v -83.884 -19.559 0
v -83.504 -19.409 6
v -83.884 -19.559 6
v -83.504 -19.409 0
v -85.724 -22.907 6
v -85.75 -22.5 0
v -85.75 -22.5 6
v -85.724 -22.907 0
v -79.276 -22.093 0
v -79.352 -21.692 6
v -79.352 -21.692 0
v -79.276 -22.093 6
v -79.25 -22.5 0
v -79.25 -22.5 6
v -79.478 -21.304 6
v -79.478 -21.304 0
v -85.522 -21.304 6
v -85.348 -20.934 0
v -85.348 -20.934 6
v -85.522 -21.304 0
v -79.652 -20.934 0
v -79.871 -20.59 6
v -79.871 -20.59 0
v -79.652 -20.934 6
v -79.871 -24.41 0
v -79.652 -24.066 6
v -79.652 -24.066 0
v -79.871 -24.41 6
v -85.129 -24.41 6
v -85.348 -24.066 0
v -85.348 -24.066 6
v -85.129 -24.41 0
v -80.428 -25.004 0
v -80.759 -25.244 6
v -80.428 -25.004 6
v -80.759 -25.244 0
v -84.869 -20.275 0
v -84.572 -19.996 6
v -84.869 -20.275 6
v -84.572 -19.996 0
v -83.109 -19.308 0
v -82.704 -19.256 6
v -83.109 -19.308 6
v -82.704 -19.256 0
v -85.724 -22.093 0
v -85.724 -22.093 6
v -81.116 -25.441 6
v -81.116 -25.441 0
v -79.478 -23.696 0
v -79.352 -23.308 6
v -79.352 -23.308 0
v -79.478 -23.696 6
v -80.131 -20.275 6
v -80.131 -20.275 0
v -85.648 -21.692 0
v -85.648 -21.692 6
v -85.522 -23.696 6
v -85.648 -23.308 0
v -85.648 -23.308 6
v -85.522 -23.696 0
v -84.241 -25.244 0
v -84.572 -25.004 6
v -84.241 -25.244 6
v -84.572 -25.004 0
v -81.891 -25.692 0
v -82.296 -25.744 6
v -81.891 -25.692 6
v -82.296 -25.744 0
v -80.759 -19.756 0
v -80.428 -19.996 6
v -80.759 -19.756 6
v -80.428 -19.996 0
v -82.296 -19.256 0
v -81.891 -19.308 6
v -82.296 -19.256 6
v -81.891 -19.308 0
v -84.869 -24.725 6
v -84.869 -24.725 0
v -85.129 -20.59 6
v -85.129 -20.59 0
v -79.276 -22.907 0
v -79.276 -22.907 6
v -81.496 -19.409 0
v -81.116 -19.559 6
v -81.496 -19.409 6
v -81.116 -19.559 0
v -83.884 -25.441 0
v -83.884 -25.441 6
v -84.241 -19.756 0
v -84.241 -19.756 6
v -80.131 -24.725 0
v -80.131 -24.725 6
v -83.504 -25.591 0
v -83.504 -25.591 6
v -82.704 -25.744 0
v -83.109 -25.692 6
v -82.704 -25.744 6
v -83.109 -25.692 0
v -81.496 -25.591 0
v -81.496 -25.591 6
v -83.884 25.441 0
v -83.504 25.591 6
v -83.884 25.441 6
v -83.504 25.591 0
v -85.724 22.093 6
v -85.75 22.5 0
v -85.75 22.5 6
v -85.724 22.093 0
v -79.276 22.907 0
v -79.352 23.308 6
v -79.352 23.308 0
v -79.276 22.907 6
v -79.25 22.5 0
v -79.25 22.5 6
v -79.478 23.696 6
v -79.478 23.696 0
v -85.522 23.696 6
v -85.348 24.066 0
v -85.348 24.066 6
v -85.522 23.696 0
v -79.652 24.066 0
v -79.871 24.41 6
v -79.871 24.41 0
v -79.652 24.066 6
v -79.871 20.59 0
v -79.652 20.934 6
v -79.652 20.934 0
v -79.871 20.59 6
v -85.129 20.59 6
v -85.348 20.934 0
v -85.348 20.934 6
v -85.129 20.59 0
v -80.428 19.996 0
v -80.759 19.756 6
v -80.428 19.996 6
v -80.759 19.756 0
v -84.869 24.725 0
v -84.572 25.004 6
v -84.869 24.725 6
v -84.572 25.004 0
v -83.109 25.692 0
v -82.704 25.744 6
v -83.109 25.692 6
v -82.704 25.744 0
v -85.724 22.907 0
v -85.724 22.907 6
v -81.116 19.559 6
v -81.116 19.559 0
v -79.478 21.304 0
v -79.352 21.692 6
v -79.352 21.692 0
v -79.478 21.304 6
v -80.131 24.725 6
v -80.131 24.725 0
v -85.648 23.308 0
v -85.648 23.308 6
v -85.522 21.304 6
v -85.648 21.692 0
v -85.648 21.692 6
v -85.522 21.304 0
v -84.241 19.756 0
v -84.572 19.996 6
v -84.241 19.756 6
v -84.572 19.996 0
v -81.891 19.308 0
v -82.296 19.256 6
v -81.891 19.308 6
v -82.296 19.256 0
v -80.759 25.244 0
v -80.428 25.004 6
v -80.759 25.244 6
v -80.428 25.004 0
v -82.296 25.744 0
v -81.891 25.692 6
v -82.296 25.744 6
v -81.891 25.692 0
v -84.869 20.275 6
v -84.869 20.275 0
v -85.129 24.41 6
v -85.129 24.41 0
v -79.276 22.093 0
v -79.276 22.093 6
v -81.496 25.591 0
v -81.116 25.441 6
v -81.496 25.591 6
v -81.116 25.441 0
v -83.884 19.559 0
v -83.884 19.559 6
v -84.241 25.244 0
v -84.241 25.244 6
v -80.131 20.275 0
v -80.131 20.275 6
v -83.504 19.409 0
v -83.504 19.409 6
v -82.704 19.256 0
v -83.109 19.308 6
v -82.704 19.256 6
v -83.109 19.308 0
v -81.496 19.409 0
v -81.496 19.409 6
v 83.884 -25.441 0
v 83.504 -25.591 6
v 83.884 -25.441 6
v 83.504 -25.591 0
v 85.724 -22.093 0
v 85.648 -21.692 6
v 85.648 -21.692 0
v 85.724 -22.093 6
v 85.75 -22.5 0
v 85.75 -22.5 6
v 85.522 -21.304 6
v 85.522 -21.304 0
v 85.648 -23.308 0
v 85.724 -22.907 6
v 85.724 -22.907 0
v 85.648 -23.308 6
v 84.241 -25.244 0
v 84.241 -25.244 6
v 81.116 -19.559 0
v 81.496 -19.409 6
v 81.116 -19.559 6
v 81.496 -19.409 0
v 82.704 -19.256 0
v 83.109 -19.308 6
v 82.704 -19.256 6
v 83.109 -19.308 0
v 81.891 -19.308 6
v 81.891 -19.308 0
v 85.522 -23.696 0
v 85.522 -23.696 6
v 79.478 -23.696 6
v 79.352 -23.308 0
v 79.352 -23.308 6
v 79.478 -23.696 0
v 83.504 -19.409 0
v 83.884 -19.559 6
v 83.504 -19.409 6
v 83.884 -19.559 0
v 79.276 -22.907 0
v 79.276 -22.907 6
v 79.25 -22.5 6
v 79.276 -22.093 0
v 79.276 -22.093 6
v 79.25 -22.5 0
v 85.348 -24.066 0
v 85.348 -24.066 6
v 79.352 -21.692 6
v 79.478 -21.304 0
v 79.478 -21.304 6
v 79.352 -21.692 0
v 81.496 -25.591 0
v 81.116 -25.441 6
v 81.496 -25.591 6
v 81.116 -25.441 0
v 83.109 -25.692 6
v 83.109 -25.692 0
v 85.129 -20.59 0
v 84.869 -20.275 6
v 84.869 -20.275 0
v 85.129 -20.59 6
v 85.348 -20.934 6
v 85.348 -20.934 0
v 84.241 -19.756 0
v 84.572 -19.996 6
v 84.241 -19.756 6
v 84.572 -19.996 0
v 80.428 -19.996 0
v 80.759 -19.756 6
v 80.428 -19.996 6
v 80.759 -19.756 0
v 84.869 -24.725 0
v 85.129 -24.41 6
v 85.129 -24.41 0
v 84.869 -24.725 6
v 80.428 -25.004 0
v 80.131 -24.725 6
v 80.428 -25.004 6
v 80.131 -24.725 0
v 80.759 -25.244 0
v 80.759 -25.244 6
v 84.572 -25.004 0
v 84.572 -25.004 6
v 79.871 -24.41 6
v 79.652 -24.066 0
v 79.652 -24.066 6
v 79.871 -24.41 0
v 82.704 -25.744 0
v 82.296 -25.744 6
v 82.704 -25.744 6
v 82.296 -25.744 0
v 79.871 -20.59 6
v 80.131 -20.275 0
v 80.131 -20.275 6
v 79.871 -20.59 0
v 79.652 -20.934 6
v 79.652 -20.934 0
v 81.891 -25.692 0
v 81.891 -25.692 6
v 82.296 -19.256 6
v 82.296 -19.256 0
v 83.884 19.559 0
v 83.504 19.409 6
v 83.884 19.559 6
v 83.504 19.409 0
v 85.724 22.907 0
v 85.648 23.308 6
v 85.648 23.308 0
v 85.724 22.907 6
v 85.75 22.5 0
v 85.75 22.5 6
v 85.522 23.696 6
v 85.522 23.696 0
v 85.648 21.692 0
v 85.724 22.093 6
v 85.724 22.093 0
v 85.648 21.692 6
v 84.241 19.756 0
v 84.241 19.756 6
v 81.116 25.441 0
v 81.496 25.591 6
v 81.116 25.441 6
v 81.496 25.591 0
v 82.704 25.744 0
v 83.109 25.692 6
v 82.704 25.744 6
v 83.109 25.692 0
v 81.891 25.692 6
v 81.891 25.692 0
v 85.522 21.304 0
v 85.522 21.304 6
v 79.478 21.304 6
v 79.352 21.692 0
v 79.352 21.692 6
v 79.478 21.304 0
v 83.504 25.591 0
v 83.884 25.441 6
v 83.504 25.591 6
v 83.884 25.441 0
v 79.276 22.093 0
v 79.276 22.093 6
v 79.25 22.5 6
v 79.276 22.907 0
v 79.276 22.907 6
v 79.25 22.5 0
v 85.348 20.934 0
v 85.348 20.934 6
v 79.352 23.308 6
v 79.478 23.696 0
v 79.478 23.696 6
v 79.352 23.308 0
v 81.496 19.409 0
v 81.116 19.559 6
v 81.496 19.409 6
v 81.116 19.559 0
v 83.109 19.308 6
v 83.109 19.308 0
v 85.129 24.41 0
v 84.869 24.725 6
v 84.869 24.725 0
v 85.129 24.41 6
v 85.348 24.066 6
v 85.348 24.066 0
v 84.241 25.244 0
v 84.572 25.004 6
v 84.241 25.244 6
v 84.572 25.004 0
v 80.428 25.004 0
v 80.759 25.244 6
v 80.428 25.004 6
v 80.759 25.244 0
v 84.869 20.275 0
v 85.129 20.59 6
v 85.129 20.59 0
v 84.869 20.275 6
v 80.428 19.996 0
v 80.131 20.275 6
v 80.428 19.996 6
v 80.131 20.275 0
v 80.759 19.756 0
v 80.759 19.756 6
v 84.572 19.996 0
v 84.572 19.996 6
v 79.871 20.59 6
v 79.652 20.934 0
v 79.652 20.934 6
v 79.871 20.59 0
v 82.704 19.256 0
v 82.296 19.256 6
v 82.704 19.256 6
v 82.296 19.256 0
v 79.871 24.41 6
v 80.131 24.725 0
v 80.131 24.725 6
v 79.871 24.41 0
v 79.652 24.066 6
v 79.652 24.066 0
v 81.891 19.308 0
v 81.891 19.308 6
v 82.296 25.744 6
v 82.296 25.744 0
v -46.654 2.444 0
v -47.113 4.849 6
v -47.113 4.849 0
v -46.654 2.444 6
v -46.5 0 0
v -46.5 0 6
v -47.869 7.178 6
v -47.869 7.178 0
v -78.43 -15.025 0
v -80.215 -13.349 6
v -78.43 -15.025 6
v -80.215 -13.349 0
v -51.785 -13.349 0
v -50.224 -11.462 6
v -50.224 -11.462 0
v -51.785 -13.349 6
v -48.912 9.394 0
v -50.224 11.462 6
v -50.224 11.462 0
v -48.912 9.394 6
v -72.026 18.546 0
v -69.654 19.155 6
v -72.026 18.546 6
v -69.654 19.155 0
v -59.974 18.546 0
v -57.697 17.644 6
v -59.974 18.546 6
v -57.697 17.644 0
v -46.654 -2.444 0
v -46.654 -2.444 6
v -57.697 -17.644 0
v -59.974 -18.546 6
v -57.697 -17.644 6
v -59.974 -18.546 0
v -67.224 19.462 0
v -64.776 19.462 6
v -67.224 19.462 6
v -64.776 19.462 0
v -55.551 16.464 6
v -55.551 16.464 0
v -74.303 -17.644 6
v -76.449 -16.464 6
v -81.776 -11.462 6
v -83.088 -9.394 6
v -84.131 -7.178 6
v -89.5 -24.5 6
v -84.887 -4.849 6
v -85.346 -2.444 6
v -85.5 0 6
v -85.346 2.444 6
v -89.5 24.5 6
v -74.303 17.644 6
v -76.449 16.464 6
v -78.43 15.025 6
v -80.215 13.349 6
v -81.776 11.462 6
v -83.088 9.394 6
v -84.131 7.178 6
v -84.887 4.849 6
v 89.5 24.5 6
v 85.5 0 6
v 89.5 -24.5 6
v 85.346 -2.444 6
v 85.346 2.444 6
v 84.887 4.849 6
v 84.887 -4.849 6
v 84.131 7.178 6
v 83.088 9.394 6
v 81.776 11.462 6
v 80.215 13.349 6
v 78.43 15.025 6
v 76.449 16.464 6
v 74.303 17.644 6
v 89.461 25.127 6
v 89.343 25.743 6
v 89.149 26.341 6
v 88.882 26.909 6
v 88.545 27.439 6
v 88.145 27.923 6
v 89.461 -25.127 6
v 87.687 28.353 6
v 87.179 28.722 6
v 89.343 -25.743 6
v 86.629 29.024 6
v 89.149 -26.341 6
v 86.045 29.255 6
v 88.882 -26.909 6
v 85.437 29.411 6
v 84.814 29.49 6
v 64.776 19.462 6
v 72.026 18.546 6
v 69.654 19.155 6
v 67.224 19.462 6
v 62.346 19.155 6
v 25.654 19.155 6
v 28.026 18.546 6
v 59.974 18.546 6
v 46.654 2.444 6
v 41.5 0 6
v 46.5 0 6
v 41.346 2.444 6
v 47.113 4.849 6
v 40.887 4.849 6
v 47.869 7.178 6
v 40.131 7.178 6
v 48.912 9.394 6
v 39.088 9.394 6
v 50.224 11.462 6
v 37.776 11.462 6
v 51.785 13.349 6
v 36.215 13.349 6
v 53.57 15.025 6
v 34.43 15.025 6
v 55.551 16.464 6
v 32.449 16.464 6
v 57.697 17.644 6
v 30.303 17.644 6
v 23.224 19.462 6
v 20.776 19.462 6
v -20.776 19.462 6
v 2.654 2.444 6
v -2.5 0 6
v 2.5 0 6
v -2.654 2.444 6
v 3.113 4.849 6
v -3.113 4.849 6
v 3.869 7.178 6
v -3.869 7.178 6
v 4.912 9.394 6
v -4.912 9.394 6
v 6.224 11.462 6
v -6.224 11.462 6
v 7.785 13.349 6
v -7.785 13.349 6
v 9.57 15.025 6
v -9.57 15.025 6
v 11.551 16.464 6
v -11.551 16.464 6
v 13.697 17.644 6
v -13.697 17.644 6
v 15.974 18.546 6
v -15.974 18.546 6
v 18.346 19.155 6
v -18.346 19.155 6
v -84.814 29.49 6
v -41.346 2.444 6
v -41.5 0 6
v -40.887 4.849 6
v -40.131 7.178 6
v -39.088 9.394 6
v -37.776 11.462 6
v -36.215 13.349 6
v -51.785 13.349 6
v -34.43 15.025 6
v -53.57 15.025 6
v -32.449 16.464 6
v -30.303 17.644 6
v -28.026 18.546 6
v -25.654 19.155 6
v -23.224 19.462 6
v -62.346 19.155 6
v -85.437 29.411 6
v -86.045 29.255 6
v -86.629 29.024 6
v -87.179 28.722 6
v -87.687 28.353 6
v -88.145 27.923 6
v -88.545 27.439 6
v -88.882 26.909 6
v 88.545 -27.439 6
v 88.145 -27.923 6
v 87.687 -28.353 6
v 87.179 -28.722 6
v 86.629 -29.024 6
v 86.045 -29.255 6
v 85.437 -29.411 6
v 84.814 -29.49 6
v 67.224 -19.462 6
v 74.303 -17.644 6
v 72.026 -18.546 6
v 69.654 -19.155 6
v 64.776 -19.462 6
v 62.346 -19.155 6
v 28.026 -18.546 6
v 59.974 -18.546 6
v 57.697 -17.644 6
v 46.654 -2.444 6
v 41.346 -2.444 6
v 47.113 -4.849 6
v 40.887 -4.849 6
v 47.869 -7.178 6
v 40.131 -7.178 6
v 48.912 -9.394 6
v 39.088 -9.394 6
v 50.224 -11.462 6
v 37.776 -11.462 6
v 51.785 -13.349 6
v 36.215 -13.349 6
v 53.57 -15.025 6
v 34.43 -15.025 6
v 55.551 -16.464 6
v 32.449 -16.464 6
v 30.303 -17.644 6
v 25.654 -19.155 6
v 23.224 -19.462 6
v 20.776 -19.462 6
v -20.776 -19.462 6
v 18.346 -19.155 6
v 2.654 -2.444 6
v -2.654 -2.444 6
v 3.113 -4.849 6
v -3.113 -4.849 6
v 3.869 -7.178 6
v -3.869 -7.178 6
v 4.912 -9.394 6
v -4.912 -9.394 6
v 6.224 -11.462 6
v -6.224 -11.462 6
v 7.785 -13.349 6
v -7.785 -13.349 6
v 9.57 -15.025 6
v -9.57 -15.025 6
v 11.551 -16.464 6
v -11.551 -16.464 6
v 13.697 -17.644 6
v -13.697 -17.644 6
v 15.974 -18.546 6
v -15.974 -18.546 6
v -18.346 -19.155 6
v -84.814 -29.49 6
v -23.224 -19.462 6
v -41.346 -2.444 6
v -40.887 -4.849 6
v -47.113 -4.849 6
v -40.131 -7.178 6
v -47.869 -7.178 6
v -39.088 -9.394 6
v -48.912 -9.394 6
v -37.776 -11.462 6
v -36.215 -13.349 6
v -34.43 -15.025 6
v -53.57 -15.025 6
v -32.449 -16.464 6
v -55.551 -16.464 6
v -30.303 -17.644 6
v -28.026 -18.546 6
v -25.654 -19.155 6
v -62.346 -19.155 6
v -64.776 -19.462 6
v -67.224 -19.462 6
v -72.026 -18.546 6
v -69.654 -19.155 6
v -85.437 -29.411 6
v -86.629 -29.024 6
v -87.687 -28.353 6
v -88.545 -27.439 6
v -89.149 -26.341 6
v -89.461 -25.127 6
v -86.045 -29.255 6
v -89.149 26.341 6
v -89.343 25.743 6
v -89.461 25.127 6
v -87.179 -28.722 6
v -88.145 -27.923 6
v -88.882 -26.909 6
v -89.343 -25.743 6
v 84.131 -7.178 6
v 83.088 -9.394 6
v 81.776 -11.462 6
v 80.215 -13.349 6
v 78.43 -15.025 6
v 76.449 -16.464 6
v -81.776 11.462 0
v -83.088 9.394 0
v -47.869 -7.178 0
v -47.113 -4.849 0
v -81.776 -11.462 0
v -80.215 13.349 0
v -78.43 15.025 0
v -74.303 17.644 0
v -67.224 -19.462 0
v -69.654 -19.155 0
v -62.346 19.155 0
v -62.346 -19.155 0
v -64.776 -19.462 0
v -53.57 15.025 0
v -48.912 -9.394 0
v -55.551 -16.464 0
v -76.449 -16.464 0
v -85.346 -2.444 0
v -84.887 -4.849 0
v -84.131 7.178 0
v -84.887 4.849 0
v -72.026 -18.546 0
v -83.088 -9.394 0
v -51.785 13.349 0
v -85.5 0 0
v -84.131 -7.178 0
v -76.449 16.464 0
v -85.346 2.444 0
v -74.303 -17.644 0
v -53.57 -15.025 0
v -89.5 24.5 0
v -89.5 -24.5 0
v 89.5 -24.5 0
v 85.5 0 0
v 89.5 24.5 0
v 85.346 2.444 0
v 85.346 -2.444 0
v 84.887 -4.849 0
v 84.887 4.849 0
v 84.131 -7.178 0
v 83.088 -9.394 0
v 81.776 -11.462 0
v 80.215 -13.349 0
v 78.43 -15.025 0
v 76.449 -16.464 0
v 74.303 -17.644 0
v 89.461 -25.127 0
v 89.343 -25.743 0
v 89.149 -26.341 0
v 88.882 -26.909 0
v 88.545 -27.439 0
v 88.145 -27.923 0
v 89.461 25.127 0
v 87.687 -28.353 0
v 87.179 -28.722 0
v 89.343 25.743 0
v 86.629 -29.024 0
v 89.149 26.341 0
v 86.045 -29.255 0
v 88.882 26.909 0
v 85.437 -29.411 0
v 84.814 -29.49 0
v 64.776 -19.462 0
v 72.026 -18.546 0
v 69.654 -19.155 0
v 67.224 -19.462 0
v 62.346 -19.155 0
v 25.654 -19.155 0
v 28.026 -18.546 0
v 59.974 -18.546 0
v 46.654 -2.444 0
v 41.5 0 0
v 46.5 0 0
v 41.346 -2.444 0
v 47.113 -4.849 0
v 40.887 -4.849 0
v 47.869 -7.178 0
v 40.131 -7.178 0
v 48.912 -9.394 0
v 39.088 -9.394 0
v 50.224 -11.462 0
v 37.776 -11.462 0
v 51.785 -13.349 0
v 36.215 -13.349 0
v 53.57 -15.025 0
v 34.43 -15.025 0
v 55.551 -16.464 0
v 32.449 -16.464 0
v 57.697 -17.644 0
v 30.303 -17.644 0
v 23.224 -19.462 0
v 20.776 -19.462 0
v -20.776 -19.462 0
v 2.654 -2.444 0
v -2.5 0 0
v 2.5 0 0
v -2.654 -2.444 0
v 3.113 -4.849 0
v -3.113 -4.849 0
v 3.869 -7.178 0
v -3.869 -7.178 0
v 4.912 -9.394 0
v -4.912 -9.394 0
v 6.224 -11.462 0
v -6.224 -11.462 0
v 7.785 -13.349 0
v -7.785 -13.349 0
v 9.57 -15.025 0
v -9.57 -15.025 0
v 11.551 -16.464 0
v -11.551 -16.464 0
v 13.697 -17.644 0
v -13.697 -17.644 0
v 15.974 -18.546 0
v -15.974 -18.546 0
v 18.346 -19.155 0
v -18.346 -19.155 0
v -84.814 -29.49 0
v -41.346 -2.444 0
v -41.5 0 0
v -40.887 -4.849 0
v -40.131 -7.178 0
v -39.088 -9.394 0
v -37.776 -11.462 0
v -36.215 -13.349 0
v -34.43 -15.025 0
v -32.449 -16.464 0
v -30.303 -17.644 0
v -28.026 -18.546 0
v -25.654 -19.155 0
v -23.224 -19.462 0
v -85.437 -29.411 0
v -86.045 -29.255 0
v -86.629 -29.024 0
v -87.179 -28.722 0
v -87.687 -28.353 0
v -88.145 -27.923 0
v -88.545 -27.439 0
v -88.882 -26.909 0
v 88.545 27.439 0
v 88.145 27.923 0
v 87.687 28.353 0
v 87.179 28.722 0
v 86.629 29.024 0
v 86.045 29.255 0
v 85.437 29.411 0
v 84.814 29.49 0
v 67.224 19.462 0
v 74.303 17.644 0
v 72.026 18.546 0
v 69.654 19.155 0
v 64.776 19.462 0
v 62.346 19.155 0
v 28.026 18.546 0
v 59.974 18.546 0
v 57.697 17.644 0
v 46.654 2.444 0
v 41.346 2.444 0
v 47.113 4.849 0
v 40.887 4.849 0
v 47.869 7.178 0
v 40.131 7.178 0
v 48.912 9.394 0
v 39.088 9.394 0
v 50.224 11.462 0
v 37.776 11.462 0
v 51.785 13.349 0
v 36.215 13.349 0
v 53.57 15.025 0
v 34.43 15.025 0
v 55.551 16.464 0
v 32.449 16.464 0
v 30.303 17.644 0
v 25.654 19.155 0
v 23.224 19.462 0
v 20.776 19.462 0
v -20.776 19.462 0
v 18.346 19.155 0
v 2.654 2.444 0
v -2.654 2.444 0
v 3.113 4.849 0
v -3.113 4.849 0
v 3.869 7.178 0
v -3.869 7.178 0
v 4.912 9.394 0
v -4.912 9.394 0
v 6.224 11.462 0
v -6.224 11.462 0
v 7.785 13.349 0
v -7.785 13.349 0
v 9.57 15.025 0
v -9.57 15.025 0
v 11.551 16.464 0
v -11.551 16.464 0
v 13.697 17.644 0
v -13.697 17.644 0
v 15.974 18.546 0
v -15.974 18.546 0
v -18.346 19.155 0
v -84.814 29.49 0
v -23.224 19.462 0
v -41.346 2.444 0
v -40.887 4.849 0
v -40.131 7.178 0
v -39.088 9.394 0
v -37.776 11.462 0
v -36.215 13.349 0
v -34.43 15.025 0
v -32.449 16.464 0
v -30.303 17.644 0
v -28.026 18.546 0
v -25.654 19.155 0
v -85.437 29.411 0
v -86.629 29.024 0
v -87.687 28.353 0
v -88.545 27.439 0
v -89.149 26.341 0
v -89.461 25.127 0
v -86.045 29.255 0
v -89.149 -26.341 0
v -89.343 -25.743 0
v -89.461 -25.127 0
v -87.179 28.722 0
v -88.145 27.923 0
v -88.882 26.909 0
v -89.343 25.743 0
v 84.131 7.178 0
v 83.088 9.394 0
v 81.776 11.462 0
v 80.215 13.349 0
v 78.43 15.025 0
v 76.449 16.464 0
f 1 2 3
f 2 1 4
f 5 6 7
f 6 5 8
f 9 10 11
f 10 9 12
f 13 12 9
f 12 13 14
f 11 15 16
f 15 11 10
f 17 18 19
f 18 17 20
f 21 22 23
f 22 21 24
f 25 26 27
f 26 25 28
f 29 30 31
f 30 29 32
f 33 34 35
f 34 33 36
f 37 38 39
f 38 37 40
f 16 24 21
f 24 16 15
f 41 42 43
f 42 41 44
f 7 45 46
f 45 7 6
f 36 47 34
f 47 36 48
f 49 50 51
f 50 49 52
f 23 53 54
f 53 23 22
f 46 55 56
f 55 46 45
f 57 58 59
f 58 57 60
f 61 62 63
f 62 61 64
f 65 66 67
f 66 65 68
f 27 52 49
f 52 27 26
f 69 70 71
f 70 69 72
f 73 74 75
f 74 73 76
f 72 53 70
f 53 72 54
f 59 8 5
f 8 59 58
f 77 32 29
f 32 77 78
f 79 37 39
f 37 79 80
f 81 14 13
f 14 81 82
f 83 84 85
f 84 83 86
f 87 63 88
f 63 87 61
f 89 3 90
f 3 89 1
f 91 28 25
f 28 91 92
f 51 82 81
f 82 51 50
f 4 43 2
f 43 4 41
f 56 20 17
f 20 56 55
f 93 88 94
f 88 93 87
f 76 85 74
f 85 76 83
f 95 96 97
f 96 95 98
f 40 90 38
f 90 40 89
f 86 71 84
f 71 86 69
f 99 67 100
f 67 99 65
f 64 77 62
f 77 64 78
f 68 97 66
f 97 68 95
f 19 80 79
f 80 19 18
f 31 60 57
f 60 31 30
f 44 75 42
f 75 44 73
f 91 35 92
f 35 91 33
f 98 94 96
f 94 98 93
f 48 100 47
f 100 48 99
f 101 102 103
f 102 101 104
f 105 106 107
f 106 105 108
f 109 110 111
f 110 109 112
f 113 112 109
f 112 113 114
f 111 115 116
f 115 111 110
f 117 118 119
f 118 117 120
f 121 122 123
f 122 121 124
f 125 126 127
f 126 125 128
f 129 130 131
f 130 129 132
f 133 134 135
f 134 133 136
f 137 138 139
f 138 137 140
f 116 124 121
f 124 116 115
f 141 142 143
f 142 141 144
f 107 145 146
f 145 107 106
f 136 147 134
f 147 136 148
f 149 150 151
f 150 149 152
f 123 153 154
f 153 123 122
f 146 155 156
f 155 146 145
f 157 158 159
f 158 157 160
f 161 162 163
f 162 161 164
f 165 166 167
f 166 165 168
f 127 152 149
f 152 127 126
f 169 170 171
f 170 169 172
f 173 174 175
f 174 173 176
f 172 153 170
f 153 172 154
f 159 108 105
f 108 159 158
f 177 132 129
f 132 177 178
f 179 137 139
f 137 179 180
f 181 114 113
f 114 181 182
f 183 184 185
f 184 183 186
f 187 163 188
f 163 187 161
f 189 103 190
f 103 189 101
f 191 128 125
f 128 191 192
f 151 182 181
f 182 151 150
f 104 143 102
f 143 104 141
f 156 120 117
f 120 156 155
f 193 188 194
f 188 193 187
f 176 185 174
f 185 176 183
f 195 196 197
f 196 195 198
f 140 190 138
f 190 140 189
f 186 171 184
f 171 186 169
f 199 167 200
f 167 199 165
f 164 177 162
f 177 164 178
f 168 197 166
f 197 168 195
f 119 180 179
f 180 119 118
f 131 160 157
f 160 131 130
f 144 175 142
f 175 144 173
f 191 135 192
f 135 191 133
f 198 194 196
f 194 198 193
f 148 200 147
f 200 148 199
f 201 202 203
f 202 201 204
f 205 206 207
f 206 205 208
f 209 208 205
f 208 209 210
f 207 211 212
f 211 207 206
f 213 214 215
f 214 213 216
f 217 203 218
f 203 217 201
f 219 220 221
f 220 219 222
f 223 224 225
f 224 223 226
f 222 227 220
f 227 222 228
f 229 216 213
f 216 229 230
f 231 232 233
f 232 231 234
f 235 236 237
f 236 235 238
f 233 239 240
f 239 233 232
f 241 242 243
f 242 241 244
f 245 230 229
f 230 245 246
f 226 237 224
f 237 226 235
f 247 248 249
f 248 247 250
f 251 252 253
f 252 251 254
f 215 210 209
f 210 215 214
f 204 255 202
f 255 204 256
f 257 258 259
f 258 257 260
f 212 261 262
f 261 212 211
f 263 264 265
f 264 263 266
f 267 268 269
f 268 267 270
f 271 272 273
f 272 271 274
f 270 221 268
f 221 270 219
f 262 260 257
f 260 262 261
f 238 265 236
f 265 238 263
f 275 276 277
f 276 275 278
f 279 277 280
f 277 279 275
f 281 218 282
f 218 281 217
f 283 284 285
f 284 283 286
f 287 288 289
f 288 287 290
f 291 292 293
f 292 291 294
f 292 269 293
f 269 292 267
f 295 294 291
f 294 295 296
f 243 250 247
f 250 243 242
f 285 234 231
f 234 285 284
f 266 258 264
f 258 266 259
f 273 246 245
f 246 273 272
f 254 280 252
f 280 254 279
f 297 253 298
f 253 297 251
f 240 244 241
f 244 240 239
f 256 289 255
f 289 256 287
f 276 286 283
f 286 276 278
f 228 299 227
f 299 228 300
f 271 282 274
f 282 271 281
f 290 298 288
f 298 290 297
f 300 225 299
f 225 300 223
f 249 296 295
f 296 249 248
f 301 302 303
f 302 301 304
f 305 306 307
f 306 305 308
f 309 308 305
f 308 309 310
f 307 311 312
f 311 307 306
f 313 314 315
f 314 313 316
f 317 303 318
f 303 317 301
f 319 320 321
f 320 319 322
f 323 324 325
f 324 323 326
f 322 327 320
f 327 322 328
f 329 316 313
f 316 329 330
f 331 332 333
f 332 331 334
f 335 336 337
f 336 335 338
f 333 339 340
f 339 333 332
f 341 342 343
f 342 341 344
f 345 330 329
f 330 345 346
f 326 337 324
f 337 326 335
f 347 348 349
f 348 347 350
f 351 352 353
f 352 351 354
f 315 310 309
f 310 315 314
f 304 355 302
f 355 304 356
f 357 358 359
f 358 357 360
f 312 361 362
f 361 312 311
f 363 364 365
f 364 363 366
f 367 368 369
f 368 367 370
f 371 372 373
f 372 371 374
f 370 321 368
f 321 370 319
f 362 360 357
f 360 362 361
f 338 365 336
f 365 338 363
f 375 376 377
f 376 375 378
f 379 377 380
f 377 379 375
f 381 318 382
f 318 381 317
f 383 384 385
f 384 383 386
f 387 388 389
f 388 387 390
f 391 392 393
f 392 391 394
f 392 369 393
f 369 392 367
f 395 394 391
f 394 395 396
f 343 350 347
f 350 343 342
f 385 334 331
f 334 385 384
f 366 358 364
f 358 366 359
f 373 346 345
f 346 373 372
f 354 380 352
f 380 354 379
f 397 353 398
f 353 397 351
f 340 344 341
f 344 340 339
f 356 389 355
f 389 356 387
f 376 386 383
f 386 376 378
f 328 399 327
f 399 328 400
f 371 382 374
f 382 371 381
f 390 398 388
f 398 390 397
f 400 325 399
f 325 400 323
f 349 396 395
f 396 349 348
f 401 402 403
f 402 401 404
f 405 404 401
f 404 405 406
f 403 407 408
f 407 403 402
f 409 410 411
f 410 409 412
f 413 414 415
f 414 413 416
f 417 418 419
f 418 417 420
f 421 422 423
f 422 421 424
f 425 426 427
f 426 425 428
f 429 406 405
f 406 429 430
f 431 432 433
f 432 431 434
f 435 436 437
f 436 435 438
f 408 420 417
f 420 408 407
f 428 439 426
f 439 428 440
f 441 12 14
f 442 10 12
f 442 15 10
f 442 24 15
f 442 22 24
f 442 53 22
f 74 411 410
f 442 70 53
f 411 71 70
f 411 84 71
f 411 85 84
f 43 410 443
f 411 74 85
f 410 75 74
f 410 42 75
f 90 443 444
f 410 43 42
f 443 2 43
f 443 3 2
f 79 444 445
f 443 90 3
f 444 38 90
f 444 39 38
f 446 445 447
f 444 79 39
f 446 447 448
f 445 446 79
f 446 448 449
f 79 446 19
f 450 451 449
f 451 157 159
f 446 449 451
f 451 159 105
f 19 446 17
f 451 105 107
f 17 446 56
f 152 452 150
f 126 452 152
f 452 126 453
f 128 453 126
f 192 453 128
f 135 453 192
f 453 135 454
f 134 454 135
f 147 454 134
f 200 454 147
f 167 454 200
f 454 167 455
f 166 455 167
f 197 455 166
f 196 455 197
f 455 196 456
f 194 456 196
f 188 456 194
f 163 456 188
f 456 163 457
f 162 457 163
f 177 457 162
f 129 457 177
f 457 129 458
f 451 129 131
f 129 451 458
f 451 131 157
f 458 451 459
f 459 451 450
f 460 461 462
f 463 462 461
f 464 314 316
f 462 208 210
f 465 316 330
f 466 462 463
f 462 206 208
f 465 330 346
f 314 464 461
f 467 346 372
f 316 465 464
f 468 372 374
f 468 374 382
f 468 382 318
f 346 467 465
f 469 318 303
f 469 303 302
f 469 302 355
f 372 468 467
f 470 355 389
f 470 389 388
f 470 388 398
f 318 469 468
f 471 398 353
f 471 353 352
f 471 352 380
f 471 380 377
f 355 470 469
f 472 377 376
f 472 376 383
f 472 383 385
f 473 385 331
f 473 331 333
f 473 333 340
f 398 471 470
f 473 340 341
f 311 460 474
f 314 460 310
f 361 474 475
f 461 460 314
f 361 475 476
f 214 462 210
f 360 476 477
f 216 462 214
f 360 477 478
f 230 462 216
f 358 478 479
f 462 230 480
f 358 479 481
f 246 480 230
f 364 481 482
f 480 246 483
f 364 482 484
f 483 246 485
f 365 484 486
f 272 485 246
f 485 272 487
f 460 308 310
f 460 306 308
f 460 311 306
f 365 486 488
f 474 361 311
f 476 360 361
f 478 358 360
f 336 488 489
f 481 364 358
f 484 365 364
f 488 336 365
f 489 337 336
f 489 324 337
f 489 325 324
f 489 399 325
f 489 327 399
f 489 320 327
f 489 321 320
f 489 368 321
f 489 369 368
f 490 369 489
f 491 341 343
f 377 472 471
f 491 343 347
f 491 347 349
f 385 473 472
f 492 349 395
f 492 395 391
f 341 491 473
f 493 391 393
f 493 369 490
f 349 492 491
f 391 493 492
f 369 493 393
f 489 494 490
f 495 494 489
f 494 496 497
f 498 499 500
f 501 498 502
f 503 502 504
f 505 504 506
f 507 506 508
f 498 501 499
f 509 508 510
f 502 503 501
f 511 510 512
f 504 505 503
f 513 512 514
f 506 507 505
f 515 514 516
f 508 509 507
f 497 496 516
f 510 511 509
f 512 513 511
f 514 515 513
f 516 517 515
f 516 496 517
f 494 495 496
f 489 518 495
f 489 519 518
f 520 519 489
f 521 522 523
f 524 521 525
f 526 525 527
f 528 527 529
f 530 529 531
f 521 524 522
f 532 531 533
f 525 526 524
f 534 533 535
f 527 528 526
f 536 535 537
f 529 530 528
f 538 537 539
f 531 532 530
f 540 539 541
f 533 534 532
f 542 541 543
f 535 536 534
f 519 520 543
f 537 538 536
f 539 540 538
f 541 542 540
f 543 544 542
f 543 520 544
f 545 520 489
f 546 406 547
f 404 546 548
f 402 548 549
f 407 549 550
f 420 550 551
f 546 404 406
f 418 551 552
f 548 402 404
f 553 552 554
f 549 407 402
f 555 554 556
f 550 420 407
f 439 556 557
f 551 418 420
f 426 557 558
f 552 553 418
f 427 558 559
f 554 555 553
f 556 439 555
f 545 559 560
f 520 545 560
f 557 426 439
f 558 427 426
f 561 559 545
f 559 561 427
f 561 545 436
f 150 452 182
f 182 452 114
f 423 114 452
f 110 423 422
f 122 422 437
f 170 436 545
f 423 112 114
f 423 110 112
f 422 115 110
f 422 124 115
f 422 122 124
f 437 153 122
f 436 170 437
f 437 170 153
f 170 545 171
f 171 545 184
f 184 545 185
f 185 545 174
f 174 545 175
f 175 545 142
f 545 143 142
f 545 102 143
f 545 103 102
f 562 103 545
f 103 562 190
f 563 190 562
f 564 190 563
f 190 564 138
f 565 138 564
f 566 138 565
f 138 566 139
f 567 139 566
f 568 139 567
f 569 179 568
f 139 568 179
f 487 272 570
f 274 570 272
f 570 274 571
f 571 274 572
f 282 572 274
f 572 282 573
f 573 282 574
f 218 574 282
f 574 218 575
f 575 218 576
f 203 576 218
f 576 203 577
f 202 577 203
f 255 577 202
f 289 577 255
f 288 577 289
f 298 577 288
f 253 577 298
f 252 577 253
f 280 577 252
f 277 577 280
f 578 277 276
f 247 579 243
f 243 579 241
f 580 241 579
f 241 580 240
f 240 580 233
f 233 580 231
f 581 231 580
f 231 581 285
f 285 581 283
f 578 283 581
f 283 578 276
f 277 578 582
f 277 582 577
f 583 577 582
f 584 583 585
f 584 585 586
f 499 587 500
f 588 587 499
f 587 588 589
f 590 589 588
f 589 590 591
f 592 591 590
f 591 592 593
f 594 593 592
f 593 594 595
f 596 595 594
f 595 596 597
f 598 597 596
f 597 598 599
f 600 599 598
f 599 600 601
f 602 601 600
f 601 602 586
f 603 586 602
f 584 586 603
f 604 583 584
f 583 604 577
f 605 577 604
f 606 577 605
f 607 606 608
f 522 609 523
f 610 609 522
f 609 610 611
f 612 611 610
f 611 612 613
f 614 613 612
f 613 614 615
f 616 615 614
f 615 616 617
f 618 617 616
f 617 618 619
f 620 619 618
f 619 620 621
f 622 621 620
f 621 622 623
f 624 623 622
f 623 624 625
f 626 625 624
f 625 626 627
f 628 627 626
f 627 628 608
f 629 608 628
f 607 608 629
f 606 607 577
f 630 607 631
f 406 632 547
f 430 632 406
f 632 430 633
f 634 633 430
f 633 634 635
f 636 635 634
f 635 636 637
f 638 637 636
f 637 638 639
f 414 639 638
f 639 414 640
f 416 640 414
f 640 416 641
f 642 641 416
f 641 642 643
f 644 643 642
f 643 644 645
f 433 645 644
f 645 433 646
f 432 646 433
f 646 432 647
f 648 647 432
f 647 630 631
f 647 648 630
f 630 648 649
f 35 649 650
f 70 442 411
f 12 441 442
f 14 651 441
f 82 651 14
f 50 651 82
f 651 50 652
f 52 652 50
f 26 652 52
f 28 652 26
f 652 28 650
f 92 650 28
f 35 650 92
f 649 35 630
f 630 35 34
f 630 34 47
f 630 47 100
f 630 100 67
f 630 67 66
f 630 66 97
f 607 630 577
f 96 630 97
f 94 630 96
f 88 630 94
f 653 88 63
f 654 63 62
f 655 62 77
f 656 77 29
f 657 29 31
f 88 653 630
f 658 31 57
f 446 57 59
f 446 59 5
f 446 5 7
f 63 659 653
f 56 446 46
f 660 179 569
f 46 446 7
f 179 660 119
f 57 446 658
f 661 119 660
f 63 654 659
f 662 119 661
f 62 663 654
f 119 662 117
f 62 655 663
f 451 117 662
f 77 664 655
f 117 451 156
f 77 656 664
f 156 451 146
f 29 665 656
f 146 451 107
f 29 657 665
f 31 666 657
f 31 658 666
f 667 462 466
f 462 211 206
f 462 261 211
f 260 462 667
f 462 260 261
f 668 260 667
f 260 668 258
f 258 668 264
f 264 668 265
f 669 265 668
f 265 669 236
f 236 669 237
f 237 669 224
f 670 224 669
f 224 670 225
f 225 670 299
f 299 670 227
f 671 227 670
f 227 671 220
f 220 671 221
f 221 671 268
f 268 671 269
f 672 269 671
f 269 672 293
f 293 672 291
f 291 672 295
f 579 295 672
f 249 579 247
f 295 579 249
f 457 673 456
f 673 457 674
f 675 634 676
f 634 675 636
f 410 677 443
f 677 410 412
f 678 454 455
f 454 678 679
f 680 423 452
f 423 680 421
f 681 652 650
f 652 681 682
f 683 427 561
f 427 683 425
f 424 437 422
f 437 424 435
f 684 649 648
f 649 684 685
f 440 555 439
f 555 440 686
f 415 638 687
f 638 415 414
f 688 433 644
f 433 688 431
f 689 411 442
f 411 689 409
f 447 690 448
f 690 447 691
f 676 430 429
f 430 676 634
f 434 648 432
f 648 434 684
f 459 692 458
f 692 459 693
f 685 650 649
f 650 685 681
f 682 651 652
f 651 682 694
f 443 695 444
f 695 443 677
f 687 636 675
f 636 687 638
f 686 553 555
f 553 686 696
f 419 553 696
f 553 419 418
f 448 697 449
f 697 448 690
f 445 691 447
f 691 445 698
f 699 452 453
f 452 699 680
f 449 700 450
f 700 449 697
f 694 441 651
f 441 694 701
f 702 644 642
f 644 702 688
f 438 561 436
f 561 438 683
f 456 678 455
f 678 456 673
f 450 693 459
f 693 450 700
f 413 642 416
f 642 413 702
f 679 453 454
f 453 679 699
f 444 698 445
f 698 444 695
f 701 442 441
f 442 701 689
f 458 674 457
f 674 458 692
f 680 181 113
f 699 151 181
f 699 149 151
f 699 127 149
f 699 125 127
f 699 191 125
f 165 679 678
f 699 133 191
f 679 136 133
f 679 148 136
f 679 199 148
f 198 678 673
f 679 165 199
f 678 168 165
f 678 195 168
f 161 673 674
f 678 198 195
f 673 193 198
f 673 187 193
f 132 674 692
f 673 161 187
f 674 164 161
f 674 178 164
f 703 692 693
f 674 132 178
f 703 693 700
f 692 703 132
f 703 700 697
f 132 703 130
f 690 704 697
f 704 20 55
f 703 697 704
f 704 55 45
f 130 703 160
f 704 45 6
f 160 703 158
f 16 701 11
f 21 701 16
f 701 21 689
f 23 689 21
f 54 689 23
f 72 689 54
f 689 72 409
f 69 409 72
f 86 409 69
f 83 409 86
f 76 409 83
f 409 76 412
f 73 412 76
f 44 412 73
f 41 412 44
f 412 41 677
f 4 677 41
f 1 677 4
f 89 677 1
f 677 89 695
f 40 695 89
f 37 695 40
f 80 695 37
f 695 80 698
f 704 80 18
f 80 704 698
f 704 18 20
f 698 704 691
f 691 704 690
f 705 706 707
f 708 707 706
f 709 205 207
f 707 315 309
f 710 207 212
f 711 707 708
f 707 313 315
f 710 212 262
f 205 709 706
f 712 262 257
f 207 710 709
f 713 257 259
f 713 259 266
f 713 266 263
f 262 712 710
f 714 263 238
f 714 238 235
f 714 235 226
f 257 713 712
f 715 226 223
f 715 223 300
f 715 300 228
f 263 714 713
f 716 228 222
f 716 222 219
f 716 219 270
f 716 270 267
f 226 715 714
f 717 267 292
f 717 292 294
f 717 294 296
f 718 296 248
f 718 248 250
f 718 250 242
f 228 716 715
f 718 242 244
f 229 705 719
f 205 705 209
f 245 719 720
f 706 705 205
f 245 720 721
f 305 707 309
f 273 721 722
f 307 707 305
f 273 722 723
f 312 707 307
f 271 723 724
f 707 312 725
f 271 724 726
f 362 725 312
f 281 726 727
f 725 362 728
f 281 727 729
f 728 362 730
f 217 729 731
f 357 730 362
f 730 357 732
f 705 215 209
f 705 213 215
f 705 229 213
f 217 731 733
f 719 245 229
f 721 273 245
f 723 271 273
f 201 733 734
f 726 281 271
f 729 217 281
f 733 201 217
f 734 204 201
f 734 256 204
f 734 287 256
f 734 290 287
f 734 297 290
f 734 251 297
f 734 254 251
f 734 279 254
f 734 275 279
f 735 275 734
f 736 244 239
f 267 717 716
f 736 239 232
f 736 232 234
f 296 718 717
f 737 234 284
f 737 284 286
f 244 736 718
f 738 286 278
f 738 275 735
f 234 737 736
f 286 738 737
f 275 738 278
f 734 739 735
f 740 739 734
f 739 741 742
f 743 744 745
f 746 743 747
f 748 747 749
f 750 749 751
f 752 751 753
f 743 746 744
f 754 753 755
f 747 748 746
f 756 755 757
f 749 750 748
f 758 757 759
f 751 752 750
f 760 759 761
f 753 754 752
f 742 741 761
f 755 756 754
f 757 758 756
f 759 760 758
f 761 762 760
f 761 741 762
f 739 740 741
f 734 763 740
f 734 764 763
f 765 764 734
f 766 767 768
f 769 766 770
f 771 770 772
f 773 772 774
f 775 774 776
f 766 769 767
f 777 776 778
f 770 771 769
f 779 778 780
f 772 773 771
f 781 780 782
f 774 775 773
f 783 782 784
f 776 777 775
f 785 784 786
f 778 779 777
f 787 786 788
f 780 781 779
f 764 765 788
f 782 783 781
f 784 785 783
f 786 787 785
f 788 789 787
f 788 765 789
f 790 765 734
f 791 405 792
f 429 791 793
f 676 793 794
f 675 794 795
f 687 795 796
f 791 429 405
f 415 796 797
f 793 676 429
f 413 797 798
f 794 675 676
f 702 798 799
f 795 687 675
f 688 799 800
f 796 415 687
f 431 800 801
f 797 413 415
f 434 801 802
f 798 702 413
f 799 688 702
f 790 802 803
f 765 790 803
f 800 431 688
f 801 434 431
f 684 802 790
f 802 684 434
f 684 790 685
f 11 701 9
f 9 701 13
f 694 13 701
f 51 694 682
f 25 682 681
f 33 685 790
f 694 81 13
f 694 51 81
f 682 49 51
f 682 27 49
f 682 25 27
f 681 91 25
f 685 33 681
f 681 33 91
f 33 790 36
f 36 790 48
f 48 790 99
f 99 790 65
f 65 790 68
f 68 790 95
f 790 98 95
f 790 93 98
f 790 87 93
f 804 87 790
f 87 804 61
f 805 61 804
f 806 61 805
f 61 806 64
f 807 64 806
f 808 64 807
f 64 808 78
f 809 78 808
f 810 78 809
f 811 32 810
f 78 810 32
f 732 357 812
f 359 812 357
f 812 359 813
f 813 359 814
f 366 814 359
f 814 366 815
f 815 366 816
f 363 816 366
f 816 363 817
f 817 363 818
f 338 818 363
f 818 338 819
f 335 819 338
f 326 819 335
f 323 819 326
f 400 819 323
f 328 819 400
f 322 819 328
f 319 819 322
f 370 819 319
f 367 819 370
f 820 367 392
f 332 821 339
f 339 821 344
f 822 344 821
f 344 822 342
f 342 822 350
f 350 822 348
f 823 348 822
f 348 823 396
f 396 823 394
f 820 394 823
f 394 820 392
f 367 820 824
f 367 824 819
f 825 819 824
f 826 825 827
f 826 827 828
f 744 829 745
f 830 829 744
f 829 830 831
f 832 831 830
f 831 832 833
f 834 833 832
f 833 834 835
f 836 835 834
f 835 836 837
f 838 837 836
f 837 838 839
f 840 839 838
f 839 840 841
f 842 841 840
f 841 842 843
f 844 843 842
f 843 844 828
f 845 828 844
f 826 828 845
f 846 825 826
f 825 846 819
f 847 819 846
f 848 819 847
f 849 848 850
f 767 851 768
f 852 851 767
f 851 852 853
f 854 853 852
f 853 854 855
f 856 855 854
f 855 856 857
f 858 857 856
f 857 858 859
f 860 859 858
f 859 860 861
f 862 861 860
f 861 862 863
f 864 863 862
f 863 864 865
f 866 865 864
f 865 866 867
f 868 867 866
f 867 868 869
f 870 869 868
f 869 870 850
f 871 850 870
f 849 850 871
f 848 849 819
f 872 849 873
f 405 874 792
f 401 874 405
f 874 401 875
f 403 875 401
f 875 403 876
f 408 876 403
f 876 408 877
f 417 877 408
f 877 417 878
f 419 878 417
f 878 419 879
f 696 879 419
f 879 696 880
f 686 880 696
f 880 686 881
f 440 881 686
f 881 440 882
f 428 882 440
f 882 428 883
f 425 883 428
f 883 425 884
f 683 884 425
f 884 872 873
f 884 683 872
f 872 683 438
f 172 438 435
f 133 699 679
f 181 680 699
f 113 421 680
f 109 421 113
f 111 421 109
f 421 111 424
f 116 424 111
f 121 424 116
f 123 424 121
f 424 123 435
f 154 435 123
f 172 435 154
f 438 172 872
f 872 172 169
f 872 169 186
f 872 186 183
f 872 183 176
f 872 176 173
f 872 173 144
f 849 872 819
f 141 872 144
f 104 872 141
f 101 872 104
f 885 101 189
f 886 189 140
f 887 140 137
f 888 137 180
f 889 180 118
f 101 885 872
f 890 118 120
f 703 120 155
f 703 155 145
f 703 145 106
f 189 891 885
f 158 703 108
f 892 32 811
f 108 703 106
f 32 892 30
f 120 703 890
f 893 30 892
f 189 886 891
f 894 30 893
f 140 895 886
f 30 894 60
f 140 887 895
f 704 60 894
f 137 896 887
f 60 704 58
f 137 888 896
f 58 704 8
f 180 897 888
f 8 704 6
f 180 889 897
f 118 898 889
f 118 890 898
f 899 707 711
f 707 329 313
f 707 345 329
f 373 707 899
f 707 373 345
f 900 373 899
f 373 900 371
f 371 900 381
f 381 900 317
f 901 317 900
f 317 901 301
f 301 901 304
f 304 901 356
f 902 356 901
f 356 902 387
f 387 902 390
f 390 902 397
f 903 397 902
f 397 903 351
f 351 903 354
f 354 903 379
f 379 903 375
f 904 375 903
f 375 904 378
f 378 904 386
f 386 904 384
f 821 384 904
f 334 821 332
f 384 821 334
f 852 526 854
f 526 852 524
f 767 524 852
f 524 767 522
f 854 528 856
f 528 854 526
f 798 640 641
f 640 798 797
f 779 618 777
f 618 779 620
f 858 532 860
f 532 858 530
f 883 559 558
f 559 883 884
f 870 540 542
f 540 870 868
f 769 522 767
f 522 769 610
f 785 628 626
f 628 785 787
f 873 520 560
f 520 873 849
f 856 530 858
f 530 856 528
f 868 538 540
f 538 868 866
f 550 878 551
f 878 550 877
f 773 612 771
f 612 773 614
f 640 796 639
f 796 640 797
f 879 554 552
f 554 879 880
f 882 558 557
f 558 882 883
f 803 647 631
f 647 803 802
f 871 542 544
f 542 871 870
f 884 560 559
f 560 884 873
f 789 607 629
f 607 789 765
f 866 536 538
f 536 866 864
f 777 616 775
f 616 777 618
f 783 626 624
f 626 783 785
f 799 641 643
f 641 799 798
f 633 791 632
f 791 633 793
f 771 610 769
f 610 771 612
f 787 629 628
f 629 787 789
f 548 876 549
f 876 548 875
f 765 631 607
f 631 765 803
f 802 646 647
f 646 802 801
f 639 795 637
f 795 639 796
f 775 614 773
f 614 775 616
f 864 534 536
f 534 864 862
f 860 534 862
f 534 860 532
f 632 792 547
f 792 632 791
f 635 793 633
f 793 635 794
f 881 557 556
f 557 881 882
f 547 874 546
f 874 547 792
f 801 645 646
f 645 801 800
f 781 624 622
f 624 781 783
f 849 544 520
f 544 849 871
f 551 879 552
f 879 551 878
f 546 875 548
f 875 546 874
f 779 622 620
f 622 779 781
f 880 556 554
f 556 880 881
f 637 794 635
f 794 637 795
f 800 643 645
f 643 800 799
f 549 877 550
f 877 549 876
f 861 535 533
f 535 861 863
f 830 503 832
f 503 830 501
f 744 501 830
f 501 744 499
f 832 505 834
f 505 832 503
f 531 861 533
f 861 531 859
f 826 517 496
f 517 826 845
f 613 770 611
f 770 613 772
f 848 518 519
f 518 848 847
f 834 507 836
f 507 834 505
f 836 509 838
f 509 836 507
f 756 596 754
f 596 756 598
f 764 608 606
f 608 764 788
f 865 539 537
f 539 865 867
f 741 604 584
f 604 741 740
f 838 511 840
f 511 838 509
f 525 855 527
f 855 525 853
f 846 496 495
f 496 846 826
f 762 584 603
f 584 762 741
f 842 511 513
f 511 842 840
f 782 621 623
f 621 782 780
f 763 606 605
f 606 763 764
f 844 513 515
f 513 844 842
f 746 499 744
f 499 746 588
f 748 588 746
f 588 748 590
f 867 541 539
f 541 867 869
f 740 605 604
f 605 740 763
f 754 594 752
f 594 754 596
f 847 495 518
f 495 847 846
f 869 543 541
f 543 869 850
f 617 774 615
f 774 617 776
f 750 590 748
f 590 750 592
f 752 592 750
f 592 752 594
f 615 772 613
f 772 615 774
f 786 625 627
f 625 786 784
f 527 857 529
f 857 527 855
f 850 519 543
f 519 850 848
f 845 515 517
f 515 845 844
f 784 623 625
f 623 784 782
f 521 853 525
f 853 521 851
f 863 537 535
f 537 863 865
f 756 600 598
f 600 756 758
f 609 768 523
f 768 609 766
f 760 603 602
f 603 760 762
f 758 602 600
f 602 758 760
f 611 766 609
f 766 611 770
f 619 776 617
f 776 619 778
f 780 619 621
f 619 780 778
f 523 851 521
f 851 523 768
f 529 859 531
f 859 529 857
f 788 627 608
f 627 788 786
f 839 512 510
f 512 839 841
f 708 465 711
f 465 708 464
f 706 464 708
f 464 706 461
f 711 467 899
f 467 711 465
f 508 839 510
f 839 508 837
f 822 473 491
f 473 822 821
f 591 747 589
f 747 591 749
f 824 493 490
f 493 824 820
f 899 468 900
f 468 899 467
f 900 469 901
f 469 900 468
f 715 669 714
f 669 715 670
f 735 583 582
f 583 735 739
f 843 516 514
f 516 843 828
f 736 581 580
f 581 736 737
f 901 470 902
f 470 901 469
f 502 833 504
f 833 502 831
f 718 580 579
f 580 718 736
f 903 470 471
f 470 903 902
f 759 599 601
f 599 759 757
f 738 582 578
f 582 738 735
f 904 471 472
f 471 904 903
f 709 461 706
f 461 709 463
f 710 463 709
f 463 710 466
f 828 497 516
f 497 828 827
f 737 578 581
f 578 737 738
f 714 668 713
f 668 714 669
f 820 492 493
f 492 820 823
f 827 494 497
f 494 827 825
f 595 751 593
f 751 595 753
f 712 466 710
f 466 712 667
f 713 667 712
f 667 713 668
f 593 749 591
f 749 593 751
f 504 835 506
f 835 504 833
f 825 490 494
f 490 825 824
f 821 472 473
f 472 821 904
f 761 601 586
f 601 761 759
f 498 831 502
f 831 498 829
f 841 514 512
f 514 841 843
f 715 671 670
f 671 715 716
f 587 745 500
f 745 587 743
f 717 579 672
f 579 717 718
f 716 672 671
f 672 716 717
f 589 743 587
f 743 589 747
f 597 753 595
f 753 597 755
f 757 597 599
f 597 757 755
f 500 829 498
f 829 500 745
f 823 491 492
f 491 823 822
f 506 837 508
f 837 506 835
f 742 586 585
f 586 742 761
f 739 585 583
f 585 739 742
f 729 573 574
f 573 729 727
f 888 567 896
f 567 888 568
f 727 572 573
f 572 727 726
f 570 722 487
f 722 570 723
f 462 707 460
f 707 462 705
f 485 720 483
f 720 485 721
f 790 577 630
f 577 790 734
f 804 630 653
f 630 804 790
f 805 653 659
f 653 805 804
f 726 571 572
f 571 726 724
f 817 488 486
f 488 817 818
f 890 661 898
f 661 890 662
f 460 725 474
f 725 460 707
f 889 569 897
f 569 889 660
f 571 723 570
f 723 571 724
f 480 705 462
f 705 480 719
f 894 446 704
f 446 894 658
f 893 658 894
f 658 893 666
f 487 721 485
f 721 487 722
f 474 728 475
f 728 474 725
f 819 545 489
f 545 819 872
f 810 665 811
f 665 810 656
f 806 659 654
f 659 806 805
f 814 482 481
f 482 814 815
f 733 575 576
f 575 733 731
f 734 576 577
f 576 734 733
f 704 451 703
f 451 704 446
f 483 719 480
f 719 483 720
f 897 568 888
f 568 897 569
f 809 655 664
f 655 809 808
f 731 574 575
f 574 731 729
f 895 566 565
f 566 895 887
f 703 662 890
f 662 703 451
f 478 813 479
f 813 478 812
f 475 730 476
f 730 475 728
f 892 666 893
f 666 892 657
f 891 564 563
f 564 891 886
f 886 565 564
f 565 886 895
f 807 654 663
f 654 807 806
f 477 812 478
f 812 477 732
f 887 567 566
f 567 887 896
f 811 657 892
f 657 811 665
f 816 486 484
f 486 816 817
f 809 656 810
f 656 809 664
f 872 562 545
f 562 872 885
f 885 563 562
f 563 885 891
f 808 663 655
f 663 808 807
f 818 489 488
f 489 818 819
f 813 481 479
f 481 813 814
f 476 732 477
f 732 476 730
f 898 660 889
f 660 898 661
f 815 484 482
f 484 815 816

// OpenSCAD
$fn = 50;


difference() {
	union() {
		hull() {
			translate(v = [-84.5000000000, 24.5000000000, 0]) {
				cylinder(h = 6, r = 5);
			}
			translate(v = [84.5000000000, 24.5000000000, 0]) {
				cylinder(h = 6, r = 5);
			}
			translate(v = [-84.5000000000, -24.5000000000, 0]) {
				cylinder(h = 6, r = 5);
			}
			translate(v = [84.5000000000, -24.5000000000, 0]) {
				cylinder(h = 6, r = 5);
			}
		}
	}
	union() {
		#translate(v = [-82.5000000000, -22.5000000000, -100.0000000000]) {
			cylinder(h = 200, r = 3.2500000000);
		}
		#translate(v = [-82.5000000000, 22.5000000000, -100.0000000000]) {
			cylinder(h = 200, r = 3.2500000000);
		}
		#translate(v = [82.5000000000, -22.5000000000, -100.0000000000]) {
			cylinder(h = 200, r = 3.2500000000);
		}
		#translate(v = [82.5000000000, 22.5000000000, -100.0000000000]) {
			cylinder(h = 200, r = 3.2500000000);
		}
		#translate(v = [-66.0000000000, 0, 0]) {
			cylinder(h = 6, r = 19.5000000000);
		}
		#translate(v = [-22.0000000000, 0, 0]) {
			cylinder(h = 6, r = 19.5000000000);
		}
		#translate(v = [22.0000000000, 0, 0]) {
			cylinder(h = 6, r = 19.5000000000);
		}
		#translate(v = [66.0000000000, 0, 0]) {
			cylinder(h = 6, r = 19.5000000000);
		}
	}
}
